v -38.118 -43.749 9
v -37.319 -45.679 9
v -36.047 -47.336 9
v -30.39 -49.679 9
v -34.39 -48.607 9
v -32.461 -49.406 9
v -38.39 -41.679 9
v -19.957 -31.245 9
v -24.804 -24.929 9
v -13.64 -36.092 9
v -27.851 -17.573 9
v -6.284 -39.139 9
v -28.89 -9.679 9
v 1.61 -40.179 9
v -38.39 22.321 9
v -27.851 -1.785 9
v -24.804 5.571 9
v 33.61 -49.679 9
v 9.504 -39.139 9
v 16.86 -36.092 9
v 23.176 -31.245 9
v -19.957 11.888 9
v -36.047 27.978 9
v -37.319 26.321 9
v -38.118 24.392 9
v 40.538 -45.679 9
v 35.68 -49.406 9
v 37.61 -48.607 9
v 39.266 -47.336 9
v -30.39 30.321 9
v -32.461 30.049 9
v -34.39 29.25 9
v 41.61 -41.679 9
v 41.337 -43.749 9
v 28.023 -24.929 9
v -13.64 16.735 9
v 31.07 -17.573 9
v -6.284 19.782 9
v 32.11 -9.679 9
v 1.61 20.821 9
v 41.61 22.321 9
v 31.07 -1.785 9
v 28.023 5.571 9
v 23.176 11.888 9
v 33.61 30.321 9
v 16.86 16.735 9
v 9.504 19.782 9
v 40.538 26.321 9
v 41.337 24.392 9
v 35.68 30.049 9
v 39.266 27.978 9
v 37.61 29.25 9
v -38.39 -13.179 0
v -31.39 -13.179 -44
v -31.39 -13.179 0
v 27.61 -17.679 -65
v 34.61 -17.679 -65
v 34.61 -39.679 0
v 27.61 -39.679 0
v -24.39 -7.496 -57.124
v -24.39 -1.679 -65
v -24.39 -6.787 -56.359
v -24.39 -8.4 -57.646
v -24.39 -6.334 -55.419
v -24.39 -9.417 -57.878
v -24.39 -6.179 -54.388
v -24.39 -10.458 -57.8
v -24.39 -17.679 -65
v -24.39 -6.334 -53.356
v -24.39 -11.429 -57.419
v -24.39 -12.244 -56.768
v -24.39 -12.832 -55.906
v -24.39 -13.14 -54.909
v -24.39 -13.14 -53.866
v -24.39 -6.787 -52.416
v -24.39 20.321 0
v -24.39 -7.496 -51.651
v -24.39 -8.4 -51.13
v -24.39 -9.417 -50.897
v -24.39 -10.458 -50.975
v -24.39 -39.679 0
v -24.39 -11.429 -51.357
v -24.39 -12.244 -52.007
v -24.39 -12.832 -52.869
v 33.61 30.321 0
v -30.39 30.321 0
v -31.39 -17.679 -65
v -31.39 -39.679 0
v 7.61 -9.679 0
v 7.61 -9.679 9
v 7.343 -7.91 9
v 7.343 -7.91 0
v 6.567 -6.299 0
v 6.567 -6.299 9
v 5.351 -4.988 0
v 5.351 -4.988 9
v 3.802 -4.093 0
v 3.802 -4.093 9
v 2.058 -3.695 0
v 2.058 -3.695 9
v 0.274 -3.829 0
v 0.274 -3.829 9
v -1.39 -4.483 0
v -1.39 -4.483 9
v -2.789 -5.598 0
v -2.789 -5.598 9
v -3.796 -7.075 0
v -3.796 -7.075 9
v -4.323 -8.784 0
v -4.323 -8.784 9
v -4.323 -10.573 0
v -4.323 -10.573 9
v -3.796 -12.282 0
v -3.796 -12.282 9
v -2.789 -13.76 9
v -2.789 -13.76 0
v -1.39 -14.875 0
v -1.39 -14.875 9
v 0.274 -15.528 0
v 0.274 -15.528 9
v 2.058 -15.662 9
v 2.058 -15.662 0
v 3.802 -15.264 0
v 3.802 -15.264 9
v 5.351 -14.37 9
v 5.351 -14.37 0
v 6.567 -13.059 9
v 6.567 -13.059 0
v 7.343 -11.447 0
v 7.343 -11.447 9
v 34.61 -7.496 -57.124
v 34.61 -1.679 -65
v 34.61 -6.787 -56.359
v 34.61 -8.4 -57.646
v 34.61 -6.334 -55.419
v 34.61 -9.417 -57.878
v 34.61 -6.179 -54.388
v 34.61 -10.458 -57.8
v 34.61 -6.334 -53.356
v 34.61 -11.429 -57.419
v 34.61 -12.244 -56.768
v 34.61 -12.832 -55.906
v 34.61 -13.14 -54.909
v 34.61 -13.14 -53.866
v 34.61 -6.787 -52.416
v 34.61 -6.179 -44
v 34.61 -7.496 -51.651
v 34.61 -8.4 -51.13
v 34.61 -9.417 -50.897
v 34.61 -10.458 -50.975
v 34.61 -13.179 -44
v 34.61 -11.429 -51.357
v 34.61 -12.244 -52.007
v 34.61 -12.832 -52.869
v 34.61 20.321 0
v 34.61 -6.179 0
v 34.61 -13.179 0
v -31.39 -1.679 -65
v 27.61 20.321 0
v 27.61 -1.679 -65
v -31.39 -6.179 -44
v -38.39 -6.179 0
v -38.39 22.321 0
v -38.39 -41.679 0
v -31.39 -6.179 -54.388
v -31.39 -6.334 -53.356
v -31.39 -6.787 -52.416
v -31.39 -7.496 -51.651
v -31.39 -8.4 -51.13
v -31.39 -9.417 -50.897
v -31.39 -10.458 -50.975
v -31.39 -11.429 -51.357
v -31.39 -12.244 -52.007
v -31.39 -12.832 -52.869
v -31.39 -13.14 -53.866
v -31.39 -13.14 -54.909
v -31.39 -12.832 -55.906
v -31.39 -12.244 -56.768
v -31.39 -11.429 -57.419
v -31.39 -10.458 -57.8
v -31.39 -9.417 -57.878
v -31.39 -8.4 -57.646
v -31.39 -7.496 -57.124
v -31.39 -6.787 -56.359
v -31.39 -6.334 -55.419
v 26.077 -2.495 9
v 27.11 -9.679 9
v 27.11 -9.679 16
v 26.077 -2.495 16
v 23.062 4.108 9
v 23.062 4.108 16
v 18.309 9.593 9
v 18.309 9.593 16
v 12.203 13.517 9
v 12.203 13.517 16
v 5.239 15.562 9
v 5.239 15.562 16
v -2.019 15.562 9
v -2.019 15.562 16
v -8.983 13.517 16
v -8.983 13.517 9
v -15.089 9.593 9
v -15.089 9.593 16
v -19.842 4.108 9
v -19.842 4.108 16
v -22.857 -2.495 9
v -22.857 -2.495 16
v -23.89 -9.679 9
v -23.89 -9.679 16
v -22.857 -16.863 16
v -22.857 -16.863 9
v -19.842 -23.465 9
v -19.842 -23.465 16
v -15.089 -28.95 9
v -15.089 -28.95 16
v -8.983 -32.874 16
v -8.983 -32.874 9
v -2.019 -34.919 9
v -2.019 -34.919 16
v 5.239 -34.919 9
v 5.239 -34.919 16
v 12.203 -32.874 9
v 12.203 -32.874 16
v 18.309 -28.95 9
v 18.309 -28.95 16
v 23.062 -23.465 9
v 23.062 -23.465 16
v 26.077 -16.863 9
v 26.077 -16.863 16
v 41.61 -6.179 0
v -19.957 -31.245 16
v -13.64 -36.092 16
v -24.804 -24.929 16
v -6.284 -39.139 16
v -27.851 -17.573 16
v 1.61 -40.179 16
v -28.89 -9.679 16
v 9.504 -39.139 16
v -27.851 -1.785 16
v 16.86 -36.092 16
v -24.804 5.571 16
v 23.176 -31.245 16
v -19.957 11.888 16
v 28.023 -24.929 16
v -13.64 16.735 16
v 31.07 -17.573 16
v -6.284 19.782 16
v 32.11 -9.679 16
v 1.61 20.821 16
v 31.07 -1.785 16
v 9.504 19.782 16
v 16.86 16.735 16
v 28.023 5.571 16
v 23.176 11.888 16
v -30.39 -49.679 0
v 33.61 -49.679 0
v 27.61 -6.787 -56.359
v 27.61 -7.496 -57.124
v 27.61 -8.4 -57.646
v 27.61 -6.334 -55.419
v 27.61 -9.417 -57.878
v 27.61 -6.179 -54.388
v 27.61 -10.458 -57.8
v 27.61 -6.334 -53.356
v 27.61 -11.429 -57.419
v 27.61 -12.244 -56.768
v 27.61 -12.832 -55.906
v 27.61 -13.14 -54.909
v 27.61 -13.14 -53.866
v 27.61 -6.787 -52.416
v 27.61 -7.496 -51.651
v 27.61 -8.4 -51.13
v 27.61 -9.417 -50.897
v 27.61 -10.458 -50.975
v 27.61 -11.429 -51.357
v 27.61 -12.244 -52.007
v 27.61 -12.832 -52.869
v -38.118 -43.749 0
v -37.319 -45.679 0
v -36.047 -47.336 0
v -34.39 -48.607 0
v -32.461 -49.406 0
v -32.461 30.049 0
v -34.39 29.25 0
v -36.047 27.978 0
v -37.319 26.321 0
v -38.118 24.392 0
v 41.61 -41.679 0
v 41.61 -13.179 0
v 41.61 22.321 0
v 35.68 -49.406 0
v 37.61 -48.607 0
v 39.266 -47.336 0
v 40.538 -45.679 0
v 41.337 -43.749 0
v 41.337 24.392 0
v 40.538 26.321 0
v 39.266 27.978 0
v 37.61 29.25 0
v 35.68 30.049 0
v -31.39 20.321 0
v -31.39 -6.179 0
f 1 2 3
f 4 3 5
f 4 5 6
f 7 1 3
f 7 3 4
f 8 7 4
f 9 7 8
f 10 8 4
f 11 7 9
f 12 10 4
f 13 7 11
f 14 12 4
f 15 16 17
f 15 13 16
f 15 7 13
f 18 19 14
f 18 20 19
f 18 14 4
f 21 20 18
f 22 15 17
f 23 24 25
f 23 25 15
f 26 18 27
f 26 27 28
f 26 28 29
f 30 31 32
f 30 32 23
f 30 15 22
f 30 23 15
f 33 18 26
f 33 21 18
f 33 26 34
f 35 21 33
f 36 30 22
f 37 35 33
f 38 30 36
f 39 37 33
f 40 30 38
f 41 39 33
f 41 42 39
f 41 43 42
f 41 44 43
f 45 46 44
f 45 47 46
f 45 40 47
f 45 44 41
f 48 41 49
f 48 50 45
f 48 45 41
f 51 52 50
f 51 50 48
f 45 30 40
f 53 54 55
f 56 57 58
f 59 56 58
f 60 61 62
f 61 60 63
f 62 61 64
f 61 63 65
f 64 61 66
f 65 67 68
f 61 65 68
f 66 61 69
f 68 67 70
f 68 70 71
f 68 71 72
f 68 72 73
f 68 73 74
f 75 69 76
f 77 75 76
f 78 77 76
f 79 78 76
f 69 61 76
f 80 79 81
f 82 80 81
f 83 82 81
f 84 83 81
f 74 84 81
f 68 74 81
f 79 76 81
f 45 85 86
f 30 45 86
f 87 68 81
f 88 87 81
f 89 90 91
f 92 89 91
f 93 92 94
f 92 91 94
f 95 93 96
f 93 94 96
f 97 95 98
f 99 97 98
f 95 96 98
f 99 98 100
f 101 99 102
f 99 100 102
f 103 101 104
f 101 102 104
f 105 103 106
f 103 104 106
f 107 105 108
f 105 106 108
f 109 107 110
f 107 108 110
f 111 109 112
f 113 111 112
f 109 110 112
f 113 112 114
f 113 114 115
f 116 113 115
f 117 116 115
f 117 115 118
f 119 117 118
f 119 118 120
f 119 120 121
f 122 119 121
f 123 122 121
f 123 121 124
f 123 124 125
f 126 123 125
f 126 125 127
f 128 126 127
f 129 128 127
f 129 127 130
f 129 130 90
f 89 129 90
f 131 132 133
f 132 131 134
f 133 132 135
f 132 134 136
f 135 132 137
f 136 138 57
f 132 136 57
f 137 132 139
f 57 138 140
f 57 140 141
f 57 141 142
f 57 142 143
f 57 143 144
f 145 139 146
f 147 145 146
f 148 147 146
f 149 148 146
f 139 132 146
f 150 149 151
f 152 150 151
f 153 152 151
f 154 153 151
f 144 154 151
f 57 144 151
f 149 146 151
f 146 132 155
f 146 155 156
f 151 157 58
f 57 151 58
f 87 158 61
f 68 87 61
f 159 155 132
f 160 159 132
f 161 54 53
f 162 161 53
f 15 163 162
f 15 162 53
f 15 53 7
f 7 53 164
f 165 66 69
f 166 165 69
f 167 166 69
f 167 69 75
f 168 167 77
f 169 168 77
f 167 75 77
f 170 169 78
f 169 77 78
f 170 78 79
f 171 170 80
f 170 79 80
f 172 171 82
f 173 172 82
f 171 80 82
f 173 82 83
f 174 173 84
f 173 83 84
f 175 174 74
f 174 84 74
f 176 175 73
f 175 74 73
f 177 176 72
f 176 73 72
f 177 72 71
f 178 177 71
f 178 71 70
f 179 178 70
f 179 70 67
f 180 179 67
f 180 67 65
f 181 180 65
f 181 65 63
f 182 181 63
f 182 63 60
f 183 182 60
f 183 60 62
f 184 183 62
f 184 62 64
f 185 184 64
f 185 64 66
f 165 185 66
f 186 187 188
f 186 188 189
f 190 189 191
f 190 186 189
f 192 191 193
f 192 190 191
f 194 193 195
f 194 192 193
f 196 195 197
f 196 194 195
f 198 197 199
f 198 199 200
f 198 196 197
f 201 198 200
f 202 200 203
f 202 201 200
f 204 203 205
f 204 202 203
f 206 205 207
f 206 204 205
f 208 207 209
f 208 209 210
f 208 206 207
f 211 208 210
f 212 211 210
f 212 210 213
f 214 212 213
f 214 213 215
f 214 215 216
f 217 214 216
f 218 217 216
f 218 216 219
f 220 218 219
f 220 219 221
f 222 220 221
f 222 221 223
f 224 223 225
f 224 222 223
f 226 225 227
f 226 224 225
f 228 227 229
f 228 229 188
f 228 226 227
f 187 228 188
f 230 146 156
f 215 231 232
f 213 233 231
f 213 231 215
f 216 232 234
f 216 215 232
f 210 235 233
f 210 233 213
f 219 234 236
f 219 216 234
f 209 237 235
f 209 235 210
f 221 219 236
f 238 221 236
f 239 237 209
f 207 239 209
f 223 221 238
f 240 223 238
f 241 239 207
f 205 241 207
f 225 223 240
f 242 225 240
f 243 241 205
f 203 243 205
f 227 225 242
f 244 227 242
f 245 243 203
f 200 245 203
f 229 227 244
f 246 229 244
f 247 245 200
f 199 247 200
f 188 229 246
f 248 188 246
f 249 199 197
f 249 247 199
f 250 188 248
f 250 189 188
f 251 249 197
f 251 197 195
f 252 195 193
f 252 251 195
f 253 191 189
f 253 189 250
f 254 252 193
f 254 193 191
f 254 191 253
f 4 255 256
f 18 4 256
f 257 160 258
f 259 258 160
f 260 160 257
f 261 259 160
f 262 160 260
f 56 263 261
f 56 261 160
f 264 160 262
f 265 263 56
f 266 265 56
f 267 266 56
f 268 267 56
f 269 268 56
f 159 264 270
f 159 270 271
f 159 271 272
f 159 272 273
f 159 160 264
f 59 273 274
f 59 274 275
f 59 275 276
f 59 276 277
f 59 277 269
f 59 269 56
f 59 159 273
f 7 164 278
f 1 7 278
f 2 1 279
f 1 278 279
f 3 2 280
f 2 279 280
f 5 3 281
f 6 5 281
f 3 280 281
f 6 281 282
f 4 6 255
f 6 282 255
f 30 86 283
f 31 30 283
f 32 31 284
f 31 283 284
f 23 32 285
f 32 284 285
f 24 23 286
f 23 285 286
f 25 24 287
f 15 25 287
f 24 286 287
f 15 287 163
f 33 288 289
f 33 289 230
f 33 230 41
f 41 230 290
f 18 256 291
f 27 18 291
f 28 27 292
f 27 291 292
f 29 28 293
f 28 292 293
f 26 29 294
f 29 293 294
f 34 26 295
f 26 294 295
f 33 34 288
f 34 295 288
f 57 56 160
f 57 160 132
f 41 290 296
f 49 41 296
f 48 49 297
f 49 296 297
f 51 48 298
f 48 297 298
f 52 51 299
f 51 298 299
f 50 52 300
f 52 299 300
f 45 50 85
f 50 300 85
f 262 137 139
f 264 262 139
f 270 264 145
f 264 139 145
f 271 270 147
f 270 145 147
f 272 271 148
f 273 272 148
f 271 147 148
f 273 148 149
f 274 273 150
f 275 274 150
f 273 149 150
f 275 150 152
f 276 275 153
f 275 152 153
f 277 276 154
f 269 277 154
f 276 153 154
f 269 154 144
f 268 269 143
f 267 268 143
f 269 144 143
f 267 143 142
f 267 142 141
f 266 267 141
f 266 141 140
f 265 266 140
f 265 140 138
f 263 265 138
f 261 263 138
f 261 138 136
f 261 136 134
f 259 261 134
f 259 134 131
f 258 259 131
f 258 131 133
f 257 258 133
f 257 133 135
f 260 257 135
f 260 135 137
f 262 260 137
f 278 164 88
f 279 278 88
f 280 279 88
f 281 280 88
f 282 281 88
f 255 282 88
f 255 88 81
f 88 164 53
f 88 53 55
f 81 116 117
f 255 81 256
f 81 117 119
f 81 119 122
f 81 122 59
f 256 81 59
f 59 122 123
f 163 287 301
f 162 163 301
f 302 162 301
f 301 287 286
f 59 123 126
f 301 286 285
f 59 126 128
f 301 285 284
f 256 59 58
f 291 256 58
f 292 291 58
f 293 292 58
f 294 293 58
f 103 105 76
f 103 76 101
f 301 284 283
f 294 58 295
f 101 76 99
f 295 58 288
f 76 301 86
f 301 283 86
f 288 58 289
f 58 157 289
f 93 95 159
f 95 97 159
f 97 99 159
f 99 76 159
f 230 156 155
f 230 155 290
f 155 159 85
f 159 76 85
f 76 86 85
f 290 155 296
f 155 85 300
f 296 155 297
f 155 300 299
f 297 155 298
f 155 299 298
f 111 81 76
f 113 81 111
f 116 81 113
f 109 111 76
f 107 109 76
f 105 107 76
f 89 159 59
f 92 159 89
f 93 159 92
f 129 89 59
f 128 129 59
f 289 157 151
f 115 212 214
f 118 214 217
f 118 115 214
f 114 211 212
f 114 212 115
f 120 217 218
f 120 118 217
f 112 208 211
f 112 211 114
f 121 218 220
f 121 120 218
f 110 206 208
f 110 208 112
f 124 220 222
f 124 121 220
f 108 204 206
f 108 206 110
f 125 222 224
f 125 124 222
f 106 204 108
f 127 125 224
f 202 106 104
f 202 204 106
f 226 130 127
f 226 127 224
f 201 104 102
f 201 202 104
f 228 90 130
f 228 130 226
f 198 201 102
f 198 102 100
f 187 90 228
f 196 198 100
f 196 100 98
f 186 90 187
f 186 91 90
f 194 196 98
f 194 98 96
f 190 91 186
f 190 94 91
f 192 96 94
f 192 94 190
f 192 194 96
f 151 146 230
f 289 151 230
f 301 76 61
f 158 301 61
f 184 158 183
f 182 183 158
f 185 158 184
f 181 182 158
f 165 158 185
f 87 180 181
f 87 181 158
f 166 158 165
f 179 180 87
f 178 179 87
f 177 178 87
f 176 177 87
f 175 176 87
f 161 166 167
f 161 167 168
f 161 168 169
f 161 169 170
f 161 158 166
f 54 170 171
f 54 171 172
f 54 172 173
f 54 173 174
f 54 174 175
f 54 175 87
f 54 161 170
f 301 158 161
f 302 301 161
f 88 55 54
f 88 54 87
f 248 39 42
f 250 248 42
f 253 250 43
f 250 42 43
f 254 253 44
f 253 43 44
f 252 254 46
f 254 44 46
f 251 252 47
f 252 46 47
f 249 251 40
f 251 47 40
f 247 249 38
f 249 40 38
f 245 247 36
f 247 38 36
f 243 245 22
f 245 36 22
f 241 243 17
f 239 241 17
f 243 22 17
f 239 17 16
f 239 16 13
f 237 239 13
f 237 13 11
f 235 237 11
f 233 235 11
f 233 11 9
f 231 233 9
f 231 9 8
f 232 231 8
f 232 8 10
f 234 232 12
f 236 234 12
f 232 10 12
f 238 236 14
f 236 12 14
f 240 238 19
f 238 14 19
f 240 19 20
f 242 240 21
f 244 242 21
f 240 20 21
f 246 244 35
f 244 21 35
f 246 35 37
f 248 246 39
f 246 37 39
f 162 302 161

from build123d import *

# Parameters (mm, degrees)
F1_DEPTH  = 9
F2_R      = 30.5
F2_R_2    = 25.5
F3_DEPTH  = 7
F4_R      = 6
F5_DEPTH  = 9.001
F6_W      = 7
F6_H      = 60
F7_DEPTH  = 65
F9_DEPTH  = 73.001
F11_DEPTH = 7
F13_DEPTH = 43.501
F15_DEPTH = 7
F17_DEPTH = 43.501
F18_R     = 3.5
F19_DEPTH = 73.001


with BuildPart() as f1:
    # F0 (on Top) → F1 (new body)
    with BuildSketch(Plane.XY):
        with BuildLine():
            Line((33.60959, 30.321302), (-30.39041, 30.321302))
            ThreePointArc((-30.39041, 30.321302), (-36.047264, 27.978156), (-38.39041, 22.321302))
            Line((-38.39041, 22.321302), (-38.39041, -41.678698))
            ThreePointArc((-38.39041, -41.678698), (-36.047264, -47.335552), (-30.39041, -49.678698))
            Line((-30.39041, -49.678698), (33.60959, -49.678698))
            ThreePointArc((33.60959, -49.678698), (39.266444, -47.335552), (41.60959, -41.678698))
            Line((41.60959, -41.678698), (41.60959, 22.321302))
            ThreePointArc((41.60959, 22.321302), (39.266444, 27.978156), (33.60959, 30.321302))
        make_face()
    extrude(amount=F1_DEPTH)

    # F2 (on face) → F3 (join)
    with BuildSketch(Plane.XY.offset(9)):
        with Locations((1.60959, -9.678698)):
            Circle(F2_R)
        with Locations((1.60959, -9.678698)):
            Circle(F2_R_2, mode=Mode.SUBTRACT)
    extrude(amount=F3_DEPTH)

    # F4 (on face) → F5 (cut, through all)
    with BuildSketch(Plane.XY.offset(9)):
        with Locations((1.60959, -9.678698)):
            Circle(F4_R)
    extrude(amount=-F5_DEPTH, mode=Mode.SUBTRACT)

    # F6 (on face) → F7 (join)
    with BuildSketch(Plane(origin=(0, 0, 0), x_dir=(1, 0, 0), z_dir=(0, 0, -1))):
        with Locations((-27.89041, 9.678698)):
            Rectangle(F6_W, F6_H)
        with Locations((31.10959, 9.678698)):
            Rectangle(F6_W, F6_H)
    extrude(amount=F7_DEPTH)

    # F8 (on face) → F9 (cut, through all)
    with BuildSketch(Plane.YZ.offset(34.60959)):
        Polygon((20.321302, -65), (20.321302, 0), (-1.678698, -65), align=None)
        Polygon((-17.678698, -65), (-39.678698, 0), (-39.678698, -65), align=None)
    extrude(amount=-F9_DEPTH, mode=Mode.SUBTRACT)

    # F10 (on face) → F11 (join)
    with BuildSketch(Plane.YZ.offset(34.60959)):
        Polygon((-6.178698, 0), (-9.678698, 0), (-13.178698, 0), (-13.178698, -44), (-6.178698, -44), align=None)
    extrude(amount=F11_DEPTH)

    # F12 (on face) → F13 (cut, through all)
    with BuildSketch(Plane(origin=(0, -6.178698, 0), x_dir=(-1, 0, 0), z_dir=(0, 1, 0))):
        Polygon((-34.60959, -44), (-41.60959, 0), (-41.60959, -44), align=None)
    extrude(amount=-F13_DEPTH, mode=Mode.SUBTRACT)

    # F14 (on face) → F15 (join)
    with BuildSketch(Plane(origin=(-31.39041, 0, 0), x_dir=(0, -1, 0), z_dir=(-1, 0, 0))):
        Polygon((13.178698, 0), (9.678698, 0), (6.178698, 0), (6.178698, -44), (13.178698, -44), align=None)
    extrude(amount=F15_DEPTH)

    # F16 (on face) → F17 (cut, through all)
    with BuildSketch(Plane.XZ.offset(13.178698)):
        Polygon((-31.39041, -44), (-38.39041, 0), (-38.39041, -44), align=None)
    extrude(amount=-F17_DEPTH, mode=Mode.SUBTRACT)

    # F18 (on face) → F19 (cut, through all)
    with BuildSketch(Plane.YZ.offset(34.60959)):
        with Locations((-9.678698, -54.387681)):
            Circle(F18_R)
    extrude(amount=-F19_DEPTH, mode=Mode.SUBTRACT)


solid = f1.part
